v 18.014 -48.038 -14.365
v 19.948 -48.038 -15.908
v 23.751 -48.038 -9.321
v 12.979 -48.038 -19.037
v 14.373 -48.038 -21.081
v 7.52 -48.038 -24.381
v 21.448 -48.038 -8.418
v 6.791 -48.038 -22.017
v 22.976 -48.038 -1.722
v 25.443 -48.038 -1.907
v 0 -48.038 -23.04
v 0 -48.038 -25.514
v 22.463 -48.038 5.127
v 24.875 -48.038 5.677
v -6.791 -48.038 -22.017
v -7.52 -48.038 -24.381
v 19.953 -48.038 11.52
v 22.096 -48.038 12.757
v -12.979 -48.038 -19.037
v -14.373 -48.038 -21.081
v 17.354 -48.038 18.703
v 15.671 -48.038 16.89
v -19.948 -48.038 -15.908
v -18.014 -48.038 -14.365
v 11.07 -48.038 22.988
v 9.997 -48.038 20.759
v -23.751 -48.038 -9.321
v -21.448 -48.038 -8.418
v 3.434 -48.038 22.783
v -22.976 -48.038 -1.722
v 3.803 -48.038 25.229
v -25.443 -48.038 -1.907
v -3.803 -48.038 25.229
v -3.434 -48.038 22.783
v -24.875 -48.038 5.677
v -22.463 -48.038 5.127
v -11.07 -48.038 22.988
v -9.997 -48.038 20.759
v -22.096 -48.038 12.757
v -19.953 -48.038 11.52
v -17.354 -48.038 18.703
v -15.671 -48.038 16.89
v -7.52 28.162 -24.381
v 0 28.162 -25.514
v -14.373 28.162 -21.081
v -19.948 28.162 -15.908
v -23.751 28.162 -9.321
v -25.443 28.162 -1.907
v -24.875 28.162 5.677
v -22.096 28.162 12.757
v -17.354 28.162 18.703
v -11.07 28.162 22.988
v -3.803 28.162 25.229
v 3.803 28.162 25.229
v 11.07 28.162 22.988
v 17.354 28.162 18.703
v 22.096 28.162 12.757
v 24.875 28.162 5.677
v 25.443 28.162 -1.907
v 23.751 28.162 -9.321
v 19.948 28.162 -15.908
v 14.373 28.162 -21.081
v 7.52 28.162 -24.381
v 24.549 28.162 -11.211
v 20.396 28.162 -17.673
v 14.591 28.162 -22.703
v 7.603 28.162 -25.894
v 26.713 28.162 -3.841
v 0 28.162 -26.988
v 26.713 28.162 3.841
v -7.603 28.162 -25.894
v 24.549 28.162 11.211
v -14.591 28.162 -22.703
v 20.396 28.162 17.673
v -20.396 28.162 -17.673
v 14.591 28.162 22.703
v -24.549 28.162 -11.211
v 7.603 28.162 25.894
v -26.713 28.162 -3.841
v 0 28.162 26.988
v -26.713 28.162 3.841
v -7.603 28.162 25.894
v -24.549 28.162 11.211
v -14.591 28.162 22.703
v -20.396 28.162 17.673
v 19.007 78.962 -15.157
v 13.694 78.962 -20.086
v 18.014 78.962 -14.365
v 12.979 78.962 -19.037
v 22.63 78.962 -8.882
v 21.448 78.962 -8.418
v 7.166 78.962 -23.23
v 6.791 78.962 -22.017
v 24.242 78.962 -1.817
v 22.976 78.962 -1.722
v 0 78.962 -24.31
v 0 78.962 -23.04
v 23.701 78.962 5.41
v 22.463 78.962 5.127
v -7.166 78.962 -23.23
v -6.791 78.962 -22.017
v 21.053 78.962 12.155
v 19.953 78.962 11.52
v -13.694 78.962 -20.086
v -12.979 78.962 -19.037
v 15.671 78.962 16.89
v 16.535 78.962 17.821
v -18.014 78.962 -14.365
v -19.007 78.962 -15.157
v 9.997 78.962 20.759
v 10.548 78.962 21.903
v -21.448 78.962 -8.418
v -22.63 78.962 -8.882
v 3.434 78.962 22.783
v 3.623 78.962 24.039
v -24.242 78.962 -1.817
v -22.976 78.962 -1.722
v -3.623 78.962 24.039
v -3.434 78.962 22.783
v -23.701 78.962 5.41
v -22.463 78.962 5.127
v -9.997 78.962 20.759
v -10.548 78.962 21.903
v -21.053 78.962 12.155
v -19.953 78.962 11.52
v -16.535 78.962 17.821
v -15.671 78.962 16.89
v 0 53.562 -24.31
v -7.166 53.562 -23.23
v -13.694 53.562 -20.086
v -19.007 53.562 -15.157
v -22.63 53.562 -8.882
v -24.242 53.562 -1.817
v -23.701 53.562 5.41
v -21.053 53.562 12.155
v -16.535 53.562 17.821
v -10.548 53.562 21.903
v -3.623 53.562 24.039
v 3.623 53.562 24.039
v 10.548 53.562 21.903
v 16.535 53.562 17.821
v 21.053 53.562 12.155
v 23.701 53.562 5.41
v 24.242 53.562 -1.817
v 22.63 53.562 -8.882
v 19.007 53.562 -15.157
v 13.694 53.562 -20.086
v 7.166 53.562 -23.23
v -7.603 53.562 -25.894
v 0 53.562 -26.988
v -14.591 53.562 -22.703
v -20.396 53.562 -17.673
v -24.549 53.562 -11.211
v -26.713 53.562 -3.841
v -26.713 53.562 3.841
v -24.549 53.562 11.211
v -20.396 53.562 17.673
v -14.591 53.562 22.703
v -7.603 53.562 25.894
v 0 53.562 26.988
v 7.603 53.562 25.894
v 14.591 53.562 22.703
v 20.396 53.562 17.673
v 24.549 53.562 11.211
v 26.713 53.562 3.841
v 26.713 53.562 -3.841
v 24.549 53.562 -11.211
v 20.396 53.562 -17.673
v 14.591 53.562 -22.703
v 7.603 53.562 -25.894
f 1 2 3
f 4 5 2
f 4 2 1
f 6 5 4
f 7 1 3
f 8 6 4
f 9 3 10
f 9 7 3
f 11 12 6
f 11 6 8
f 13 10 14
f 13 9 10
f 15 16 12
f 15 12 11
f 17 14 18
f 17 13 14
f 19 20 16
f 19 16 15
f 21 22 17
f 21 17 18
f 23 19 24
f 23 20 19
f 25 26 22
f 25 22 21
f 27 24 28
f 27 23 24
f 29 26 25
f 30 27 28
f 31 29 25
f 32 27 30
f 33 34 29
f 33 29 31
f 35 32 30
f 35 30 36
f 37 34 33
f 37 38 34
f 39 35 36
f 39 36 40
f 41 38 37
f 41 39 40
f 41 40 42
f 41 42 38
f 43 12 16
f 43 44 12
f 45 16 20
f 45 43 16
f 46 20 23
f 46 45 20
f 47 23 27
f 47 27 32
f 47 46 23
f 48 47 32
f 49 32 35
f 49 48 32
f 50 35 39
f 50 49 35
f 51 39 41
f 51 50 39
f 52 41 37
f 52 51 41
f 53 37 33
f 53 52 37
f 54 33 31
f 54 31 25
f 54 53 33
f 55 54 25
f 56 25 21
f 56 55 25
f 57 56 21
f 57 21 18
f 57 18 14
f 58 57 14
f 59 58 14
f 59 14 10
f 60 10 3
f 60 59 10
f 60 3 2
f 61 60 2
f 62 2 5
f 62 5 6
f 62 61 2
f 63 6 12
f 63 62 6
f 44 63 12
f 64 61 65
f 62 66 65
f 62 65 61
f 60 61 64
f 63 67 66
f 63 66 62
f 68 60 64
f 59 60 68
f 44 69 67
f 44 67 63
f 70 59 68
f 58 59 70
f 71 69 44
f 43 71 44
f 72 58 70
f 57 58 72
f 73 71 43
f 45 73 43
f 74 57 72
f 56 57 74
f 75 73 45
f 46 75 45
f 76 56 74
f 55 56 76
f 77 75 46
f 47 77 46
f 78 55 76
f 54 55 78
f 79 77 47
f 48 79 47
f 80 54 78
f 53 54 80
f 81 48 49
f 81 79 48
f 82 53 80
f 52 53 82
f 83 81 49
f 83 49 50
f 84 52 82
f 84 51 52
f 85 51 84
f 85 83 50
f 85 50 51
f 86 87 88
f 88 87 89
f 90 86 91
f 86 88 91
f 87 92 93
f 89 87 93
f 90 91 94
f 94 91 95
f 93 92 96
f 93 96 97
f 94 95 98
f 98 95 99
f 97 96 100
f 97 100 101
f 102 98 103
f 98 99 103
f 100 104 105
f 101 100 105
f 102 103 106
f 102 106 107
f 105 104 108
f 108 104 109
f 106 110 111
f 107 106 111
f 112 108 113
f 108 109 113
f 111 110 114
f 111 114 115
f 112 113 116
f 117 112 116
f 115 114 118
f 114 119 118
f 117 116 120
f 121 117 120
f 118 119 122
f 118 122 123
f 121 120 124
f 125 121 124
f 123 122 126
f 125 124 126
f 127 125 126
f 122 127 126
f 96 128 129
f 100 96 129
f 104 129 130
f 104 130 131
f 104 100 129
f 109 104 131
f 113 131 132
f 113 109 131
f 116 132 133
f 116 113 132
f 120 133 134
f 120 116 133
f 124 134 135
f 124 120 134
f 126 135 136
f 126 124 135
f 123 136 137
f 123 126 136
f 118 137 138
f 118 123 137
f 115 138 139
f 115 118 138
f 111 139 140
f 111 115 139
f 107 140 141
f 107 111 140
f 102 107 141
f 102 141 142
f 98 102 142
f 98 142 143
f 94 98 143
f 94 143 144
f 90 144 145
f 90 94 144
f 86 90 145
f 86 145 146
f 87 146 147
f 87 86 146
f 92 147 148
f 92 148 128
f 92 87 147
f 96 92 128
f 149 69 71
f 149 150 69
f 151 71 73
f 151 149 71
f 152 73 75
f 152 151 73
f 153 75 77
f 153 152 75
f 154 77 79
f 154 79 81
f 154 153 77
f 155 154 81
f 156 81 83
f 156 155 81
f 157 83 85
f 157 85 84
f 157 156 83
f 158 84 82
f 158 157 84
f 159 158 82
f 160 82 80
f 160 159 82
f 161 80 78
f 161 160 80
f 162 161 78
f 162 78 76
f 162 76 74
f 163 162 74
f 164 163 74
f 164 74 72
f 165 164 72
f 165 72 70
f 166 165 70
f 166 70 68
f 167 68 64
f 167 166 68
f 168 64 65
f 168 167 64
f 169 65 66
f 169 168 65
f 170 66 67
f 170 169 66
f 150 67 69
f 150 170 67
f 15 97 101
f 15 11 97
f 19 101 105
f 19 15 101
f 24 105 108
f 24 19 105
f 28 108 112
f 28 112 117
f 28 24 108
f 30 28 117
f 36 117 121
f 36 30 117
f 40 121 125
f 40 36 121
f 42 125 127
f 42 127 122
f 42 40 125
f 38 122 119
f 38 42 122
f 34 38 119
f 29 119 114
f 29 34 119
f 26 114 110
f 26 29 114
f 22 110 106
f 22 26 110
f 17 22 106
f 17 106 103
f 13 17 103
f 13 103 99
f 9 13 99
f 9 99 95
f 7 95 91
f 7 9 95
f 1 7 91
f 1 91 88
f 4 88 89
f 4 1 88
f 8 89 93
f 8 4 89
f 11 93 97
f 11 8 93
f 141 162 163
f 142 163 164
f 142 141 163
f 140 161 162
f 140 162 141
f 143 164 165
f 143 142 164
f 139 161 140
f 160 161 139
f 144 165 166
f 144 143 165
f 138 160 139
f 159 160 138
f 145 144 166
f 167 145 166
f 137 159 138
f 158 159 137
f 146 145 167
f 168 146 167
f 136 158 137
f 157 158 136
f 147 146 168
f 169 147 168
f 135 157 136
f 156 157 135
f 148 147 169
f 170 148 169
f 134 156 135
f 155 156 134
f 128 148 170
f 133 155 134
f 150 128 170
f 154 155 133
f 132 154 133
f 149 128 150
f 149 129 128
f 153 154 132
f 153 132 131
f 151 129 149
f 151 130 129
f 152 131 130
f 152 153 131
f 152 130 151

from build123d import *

# Parameters (mm, degrees)
SKETCH1_W   = 1.27
SKETCH1_H   = 25.4
SKETCH1_W_2 = 1.4732
SKETCH1_W_3 = 2.473987507
SKETCH1_H_2 = 76.2


with BuildPart() as part:
    # Sketch1 → Revolve1 (revolve)
    with BuildSketch(Plane.XY, mode=Mode.PRIVATE) as revolve1_sk:
        with Locations((23.675312493, 66.261527288)):
            Rectangle(SKETCH1_W, SKETCH1_H)
        Polygon((24.310312493, 53.561527288), (23.040312493, 53.561527288), (23.040312493, 28.161527288), (25.5143, 28.161527288), (25.5143, 53.561527288), align=None)
        with Locations((26.2509, 40.861527288)):
            Rectangle(SKETCH1_W_2, SKETCH1_H)
        with Locations((24.277306247, -9.938472712)):
            Rectangle(SKETCH1_W_3, SKETCH1_H_2)
    revolve(revolve1_sk.sketch.rotate(Axis((0, 0, 0), (0, 1, 0)), 90), axis=Axis((0, 0, 0), (0, 1, 0)))


solid = part.part
